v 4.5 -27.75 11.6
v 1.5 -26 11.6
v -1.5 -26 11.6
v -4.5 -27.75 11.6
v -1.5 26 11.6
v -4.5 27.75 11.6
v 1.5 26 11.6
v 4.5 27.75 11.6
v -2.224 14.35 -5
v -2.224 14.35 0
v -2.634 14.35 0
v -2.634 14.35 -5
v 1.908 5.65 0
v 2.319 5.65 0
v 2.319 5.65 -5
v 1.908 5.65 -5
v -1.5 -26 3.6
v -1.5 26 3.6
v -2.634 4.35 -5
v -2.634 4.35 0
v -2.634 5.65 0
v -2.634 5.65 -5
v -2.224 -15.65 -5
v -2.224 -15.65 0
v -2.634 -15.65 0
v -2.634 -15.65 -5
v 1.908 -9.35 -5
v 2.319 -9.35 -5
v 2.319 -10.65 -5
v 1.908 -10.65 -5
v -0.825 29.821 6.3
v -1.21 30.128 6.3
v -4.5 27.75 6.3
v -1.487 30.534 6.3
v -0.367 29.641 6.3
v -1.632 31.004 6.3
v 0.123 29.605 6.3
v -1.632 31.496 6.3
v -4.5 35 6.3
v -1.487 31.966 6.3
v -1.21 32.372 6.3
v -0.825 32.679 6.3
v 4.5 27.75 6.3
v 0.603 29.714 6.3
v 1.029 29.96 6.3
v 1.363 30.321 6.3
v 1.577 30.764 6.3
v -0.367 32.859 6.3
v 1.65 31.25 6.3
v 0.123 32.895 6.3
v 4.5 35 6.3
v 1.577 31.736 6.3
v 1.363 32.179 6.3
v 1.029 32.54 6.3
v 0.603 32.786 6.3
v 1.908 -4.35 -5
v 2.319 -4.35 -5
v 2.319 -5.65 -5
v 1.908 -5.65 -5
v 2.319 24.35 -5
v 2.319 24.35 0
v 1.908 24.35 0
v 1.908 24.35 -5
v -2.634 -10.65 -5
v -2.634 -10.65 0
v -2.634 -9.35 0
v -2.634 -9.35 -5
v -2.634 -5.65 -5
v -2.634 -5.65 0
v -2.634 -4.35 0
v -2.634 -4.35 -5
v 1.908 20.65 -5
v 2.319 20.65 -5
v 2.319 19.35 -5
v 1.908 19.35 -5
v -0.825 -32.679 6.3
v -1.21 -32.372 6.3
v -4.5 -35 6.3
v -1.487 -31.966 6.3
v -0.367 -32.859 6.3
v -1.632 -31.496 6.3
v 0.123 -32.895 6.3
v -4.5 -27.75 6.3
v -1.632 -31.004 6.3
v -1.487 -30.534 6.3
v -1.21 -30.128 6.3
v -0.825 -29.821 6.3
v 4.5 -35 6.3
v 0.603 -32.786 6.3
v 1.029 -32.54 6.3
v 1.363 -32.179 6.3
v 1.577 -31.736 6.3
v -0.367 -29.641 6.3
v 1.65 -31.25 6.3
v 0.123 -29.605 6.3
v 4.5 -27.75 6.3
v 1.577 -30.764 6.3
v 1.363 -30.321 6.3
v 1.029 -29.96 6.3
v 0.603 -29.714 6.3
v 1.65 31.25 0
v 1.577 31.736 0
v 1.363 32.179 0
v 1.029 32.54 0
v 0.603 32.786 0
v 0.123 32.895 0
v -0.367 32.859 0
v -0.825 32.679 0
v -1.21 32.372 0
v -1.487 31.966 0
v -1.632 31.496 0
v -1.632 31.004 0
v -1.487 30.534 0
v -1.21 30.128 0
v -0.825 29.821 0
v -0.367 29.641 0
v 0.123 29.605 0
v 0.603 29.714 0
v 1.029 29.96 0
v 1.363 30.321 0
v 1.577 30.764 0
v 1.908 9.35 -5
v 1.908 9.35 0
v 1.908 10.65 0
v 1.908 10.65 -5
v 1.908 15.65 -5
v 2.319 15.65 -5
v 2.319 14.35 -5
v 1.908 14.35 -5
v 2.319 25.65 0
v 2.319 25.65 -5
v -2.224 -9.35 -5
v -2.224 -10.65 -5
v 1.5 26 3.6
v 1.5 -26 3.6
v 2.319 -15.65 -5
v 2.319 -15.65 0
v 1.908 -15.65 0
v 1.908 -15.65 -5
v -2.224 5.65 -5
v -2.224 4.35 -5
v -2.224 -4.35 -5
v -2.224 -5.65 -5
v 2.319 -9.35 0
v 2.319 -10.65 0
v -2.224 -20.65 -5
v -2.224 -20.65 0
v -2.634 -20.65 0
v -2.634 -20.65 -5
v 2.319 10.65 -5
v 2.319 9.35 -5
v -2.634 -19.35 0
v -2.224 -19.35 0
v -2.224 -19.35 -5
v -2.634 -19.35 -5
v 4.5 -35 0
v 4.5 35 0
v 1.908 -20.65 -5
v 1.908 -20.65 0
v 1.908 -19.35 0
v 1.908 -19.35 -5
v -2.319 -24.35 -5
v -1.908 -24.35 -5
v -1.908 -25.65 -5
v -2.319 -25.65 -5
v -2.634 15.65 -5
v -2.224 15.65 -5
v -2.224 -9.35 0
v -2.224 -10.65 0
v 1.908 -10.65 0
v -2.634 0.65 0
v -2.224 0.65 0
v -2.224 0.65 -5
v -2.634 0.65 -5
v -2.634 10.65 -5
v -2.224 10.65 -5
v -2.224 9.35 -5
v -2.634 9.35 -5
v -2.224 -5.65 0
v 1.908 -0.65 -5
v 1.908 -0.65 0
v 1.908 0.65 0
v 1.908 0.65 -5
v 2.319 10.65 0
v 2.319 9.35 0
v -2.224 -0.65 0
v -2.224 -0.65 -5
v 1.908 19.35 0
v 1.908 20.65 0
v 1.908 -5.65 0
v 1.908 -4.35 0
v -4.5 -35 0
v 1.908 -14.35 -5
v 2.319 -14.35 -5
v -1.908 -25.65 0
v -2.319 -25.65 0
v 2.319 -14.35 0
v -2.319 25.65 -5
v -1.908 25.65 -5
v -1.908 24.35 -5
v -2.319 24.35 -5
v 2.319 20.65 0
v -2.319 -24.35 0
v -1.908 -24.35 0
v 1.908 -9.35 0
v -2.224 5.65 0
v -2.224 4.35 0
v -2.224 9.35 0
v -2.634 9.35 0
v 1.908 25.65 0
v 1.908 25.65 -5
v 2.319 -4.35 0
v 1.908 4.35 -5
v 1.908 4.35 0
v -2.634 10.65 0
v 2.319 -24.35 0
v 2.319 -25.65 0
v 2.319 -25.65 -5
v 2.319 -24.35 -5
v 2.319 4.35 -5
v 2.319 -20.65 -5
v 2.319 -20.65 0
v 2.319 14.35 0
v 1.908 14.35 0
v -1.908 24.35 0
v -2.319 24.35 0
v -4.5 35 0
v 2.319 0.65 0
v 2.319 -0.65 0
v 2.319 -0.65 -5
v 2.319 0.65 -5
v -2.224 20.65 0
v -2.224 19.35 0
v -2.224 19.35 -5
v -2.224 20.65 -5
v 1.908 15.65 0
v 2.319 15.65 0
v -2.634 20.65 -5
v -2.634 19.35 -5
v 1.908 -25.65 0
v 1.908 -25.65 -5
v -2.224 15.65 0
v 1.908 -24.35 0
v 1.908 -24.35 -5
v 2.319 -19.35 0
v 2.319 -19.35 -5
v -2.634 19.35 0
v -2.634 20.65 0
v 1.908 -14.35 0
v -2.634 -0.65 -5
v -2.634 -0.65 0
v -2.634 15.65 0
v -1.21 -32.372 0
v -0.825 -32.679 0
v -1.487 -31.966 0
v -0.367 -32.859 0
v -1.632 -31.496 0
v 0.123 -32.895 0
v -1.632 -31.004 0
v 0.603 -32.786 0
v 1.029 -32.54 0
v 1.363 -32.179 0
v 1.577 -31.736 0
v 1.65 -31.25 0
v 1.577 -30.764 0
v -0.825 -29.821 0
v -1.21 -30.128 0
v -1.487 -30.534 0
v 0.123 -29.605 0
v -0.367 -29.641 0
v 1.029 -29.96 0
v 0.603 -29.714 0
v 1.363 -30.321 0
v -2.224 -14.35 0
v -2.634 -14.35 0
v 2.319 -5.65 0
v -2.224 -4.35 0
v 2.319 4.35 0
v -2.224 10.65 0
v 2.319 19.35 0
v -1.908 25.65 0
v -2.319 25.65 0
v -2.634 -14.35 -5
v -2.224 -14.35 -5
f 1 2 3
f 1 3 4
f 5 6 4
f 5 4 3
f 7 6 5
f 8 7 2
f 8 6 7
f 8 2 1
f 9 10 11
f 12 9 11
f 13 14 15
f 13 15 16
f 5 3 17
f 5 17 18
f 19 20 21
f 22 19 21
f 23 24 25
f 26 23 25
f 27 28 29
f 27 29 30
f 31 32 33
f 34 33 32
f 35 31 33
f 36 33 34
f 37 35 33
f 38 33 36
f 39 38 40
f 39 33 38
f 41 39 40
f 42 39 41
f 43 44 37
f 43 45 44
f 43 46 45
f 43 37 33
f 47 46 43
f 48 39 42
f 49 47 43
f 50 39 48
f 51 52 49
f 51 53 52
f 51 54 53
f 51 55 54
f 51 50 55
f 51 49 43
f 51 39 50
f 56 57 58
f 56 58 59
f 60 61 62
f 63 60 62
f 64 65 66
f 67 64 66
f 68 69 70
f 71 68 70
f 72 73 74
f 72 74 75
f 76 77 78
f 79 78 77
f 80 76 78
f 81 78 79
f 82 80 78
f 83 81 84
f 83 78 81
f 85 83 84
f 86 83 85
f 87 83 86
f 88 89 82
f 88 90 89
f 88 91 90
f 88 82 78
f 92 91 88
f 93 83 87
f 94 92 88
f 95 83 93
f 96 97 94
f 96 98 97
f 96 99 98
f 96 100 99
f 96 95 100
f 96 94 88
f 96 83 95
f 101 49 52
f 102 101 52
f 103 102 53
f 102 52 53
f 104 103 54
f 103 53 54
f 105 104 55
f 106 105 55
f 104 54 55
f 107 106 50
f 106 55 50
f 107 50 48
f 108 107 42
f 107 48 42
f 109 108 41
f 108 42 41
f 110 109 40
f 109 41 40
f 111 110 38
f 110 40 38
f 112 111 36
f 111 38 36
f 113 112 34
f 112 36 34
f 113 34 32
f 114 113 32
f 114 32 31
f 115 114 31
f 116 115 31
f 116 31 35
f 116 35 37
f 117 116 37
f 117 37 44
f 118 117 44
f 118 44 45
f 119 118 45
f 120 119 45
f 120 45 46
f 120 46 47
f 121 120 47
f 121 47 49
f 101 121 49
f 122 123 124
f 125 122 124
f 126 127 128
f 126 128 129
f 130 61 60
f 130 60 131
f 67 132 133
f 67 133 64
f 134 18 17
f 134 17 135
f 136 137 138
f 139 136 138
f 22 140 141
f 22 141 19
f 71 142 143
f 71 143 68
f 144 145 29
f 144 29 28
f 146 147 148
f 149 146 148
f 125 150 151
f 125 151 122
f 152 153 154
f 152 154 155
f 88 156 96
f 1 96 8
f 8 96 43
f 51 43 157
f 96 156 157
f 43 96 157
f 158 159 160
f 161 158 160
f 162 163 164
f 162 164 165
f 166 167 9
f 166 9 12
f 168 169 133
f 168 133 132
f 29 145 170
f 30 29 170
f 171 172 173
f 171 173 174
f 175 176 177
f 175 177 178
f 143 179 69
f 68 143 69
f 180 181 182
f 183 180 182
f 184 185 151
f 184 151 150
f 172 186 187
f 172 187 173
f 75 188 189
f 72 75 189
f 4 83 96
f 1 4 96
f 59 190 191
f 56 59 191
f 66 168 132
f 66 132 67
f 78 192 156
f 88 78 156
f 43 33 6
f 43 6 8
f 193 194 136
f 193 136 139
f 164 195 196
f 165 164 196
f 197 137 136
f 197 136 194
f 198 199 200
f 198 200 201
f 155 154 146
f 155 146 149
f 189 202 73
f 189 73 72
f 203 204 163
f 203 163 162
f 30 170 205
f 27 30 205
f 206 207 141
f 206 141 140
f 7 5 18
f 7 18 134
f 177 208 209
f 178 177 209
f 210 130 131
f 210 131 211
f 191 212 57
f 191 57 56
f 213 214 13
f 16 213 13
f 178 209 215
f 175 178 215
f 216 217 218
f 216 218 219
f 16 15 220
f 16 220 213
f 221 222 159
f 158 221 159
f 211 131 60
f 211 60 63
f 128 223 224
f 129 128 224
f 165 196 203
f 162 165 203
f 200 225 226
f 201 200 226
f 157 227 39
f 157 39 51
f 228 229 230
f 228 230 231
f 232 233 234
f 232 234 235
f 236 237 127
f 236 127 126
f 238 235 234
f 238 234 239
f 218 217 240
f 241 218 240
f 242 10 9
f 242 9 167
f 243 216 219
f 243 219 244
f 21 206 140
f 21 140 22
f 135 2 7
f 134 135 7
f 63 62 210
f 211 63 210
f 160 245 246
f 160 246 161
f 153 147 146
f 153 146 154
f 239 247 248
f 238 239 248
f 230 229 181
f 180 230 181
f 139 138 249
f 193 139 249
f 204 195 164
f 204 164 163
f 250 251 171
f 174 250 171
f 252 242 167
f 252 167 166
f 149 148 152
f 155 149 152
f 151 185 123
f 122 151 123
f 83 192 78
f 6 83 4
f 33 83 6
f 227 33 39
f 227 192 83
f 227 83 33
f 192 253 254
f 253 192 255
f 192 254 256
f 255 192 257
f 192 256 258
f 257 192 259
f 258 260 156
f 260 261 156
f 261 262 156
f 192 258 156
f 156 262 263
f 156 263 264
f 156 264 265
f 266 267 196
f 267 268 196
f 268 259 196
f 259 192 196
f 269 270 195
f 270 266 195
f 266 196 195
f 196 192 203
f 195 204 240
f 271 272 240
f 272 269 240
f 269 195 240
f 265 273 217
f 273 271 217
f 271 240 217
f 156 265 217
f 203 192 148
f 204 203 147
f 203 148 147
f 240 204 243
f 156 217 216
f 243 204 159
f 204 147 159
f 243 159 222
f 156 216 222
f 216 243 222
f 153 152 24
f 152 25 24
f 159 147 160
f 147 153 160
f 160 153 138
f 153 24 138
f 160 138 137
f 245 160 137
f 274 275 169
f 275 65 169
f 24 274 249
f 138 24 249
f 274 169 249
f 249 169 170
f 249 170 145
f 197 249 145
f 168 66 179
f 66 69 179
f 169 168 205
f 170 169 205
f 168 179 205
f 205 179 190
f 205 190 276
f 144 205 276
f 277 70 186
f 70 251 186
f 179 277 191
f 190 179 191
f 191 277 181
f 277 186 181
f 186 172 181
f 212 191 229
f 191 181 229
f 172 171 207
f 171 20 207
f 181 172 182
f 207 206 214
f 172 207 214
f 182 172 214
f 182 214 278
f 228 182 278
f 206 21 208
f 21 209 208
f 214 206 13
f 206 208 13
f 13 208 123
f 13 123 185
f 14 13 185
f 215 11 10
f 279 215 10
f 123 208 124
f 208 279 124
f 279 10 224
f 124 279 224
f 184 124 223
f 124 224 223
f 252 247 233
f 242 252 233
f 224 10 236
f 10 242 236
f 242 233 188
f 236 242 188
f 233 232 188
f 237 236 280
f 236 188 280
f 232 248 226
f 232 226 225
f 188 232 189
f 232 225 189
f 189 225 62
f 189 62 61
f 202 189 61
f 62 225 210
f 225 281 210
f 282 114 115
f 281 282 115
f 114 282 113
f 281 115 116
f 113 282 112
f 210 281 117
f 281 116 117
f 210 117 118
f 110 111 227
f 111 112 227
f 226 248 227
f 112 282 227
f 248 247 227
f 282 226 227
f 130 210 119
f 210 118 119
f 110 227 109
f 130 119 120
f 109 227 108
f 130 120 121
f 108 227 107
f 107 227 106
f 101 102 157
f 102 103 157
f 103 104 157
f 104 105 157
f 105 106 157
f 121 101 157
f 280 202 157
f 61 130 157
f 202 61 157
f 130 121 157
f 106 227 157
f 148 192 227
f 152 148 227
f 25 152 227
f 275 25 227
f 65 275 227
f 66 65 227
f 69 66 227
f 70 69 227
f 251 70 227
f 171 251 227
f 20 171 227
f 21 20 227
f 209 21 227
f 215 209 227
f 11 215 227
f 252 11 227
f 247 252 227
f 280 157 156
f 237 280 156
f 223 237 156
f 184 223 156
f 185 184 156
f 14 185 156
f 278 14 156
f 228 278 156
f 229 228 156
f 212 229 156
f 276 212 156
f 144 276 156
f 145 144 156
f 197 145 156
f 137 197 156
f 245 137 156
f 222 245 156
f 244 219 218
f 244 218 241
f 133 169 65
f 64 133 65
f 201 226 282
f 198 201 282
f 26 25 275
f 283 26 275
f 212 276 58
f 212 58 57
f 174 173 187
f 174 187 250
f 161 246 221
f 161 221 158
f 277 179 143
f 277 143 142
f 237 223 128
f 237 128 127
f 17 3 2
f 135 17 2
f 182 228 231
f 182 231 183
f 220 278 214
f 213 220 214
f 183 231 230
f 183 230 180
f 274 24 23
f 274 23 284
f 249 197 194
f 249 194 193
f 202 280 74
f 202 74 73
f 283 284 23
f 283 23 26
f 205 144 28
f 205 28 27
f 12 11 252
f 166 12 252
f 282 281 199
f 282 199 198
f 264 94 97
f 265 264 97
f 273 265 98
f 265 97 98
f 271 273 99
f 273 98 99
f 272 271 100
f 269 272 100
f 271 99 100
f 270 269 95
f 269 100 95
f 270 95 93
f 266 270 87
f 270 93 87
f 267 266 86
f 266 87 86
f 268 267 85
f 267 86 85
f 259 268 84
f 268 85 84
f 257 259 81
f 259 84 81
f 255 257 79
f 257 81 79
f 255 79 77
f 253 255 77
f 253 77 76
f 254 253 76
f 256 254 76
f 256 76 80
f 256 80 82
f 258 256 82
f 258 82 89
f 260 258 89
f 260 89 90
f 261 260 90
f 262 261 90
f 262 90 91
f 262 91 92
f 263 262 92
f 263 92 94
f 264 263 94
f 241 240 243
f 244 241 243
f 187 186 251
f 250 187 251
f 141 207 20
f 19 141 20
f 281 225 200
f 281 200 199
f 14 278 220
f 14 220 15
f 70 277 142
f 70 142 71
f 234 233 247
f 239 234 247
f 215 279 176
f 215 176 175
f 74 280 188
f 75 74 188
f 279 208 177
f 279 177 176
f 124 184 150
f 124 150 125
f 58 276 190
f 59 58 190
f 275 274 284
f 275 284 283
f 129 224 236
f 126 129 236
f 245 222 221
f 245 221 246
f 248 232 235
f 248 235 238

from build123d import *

# Parameters (mm, degrees)
SKETCH_1_W          = 9
SKETCH_1_H          = 70
EXTRUDE_1_DEPTH     = 6.3
SKETCH_2_W          = 9
SKETCH_2_H          = 55.5
EXTRUDE_2_DEPTH     = 5.3
SKETCH_3_R          = 1.65
CUT_EXTRUDE_1_DEPTH = 15.3
SKETCH_4_W          = 0.410265385
SKETCH_4_H          = 1.299173718
EXTRUDE_3_DEPTH     = 5
SKETCH_5_W          = 3
SKETCH_5_H          = 52
CUT_EXTRUDE_2_DEPTH = 8


with BuildPart() as part:
    # 草图1 → 拉伸1 (new body)
    with BuildSketch(Plane.XY):
        Rectangle(SKETCH_1_W, SKETCH_1_H)
    extrude(amount=EXTRUDE_1_DEPTH)

    # 草图2 → 拉伸2 (add)
    with BuildSketch(Plane.XY.offset(6.3)):
        Rectangle(SKETCH_2_W, SKETCH_2_H)
    extrude(amount=EXTRUDE_2_DEPTH)

    # 草图3 → 切除-拉伸1 (cut)
    with BuildSketch(Plane.XY.offset(6.3)):
        with Locations((0, 31.25)):
            Circle(SKETCH_3_R)
        with Locations((0, -31.25)):
            Circle(SKETCH_3_R)
    extrude(amount=-CUT_EXTRUDE_1_DEPTH, mode=Mode.SUBTRACT)

    # 草图4 → 拉伸3 (add)
    with BuildSketch(Plane(origin=(0, 0, 0), x_dir=(-1, 0, 0), z_dir=(0, 0, -1))):
        with Locations((2.113574837, 25)):
            Rectangle(SKETCH_4_W, SKETCH_4_H)
        with Locations((-2.113574837, 25)):
            Rectangle(SKETCH_4_W, SKETCH_4_H)
        with Locations((2.428938656, 20)):
            Rectangle(SKETCH_4_W, SKETCH_4_H)
        with Locations((-2.113574837, 20)):
            Rectangle(SKETCH_4_W, SKETCH_4_H)
        with Locations((2.428938656, 15)):
            Rectangle(SKETCH_4_W, SKETCH_4_H)
        with Locations((-2.113574837, 15)):
            Rectangle(SKETCH_4_W, SKETCH_4_H)
        with Locations((2.428938656, 10)):
            Rectangle(SKETCH_4_W, SKETCH_4_H)
        with Locations((-2.113574837, 10)):
            Rectangle(SKETCH_4_W, SKETCH_4_H)
        with Locations((2.428938656, 5)):
            Rectangle(SKETCH_4_W, SKETCH_4_H)
        with Locations((-2.113574837, 5)):
            Rectangle(SKETCH_4_W, SKETCH_4_H)
        with Locations((2.428938656, 0)):
            Rectangle(SKETCH_4_W, SKETCH_4_H)
        with Locations((-2.113574837, 0)):
            Rectangle(SKETCH_4_W, SKETCH_4_H)
        with Locations((-2.113574837, -5)):
            Rectangle(SKETCH_4_W, SKETCH_4_H)
        with Locations((2.428938656, -5)):
            Rectangle(SKETCH_4_W, SKETCH_4_H)
        with Locations((-2.113574837, -10)):
            Rectangle(SKETCH_4_W, SKETCH_4_H)
        with Locations((2.428938656, -10)):
            Rectangle(SKETCH_4_W, SKETCH_4_H)
        with Locations((-2.113574837, -15)):
            Rectangle(SKETCH_4_W, SKETCH_4_H)
        with Locations((2.428938656, -15)):
            Rectangle(SKETCH_4_W, SKETCH_4_H)
        with Locations((-2.113574837, -20)):
            Rectangle(SKETCH_4_W, SKETCH_4_H)
        with Locations((2.428938656, -20)):
            Rectangle(SKETCH_4_W, SKETCH_4_H)
        with Locations((2.113574837, -25)):
            Rectangle(SKETCH_4_W, SKETCH_4_H)
        with Locations((-2.113574837, -25)):
            Rectangle(SKETCH_4_W, SKETCH_4_H)
    extrude(amount=EXTRUDE_3_DEPTH)

    # 草图5 → 切除-拉伸2 (cut)
    with BuildSketch(Plane.XY.offset(11.6)):
        Rectangle(SKETCH_5_W, SKETCH_5_H)
    extrude(amount=-CUT_EXTRUDE_2_DEPTH, mode=Mode.SUBTRACT)


solid = part.part
